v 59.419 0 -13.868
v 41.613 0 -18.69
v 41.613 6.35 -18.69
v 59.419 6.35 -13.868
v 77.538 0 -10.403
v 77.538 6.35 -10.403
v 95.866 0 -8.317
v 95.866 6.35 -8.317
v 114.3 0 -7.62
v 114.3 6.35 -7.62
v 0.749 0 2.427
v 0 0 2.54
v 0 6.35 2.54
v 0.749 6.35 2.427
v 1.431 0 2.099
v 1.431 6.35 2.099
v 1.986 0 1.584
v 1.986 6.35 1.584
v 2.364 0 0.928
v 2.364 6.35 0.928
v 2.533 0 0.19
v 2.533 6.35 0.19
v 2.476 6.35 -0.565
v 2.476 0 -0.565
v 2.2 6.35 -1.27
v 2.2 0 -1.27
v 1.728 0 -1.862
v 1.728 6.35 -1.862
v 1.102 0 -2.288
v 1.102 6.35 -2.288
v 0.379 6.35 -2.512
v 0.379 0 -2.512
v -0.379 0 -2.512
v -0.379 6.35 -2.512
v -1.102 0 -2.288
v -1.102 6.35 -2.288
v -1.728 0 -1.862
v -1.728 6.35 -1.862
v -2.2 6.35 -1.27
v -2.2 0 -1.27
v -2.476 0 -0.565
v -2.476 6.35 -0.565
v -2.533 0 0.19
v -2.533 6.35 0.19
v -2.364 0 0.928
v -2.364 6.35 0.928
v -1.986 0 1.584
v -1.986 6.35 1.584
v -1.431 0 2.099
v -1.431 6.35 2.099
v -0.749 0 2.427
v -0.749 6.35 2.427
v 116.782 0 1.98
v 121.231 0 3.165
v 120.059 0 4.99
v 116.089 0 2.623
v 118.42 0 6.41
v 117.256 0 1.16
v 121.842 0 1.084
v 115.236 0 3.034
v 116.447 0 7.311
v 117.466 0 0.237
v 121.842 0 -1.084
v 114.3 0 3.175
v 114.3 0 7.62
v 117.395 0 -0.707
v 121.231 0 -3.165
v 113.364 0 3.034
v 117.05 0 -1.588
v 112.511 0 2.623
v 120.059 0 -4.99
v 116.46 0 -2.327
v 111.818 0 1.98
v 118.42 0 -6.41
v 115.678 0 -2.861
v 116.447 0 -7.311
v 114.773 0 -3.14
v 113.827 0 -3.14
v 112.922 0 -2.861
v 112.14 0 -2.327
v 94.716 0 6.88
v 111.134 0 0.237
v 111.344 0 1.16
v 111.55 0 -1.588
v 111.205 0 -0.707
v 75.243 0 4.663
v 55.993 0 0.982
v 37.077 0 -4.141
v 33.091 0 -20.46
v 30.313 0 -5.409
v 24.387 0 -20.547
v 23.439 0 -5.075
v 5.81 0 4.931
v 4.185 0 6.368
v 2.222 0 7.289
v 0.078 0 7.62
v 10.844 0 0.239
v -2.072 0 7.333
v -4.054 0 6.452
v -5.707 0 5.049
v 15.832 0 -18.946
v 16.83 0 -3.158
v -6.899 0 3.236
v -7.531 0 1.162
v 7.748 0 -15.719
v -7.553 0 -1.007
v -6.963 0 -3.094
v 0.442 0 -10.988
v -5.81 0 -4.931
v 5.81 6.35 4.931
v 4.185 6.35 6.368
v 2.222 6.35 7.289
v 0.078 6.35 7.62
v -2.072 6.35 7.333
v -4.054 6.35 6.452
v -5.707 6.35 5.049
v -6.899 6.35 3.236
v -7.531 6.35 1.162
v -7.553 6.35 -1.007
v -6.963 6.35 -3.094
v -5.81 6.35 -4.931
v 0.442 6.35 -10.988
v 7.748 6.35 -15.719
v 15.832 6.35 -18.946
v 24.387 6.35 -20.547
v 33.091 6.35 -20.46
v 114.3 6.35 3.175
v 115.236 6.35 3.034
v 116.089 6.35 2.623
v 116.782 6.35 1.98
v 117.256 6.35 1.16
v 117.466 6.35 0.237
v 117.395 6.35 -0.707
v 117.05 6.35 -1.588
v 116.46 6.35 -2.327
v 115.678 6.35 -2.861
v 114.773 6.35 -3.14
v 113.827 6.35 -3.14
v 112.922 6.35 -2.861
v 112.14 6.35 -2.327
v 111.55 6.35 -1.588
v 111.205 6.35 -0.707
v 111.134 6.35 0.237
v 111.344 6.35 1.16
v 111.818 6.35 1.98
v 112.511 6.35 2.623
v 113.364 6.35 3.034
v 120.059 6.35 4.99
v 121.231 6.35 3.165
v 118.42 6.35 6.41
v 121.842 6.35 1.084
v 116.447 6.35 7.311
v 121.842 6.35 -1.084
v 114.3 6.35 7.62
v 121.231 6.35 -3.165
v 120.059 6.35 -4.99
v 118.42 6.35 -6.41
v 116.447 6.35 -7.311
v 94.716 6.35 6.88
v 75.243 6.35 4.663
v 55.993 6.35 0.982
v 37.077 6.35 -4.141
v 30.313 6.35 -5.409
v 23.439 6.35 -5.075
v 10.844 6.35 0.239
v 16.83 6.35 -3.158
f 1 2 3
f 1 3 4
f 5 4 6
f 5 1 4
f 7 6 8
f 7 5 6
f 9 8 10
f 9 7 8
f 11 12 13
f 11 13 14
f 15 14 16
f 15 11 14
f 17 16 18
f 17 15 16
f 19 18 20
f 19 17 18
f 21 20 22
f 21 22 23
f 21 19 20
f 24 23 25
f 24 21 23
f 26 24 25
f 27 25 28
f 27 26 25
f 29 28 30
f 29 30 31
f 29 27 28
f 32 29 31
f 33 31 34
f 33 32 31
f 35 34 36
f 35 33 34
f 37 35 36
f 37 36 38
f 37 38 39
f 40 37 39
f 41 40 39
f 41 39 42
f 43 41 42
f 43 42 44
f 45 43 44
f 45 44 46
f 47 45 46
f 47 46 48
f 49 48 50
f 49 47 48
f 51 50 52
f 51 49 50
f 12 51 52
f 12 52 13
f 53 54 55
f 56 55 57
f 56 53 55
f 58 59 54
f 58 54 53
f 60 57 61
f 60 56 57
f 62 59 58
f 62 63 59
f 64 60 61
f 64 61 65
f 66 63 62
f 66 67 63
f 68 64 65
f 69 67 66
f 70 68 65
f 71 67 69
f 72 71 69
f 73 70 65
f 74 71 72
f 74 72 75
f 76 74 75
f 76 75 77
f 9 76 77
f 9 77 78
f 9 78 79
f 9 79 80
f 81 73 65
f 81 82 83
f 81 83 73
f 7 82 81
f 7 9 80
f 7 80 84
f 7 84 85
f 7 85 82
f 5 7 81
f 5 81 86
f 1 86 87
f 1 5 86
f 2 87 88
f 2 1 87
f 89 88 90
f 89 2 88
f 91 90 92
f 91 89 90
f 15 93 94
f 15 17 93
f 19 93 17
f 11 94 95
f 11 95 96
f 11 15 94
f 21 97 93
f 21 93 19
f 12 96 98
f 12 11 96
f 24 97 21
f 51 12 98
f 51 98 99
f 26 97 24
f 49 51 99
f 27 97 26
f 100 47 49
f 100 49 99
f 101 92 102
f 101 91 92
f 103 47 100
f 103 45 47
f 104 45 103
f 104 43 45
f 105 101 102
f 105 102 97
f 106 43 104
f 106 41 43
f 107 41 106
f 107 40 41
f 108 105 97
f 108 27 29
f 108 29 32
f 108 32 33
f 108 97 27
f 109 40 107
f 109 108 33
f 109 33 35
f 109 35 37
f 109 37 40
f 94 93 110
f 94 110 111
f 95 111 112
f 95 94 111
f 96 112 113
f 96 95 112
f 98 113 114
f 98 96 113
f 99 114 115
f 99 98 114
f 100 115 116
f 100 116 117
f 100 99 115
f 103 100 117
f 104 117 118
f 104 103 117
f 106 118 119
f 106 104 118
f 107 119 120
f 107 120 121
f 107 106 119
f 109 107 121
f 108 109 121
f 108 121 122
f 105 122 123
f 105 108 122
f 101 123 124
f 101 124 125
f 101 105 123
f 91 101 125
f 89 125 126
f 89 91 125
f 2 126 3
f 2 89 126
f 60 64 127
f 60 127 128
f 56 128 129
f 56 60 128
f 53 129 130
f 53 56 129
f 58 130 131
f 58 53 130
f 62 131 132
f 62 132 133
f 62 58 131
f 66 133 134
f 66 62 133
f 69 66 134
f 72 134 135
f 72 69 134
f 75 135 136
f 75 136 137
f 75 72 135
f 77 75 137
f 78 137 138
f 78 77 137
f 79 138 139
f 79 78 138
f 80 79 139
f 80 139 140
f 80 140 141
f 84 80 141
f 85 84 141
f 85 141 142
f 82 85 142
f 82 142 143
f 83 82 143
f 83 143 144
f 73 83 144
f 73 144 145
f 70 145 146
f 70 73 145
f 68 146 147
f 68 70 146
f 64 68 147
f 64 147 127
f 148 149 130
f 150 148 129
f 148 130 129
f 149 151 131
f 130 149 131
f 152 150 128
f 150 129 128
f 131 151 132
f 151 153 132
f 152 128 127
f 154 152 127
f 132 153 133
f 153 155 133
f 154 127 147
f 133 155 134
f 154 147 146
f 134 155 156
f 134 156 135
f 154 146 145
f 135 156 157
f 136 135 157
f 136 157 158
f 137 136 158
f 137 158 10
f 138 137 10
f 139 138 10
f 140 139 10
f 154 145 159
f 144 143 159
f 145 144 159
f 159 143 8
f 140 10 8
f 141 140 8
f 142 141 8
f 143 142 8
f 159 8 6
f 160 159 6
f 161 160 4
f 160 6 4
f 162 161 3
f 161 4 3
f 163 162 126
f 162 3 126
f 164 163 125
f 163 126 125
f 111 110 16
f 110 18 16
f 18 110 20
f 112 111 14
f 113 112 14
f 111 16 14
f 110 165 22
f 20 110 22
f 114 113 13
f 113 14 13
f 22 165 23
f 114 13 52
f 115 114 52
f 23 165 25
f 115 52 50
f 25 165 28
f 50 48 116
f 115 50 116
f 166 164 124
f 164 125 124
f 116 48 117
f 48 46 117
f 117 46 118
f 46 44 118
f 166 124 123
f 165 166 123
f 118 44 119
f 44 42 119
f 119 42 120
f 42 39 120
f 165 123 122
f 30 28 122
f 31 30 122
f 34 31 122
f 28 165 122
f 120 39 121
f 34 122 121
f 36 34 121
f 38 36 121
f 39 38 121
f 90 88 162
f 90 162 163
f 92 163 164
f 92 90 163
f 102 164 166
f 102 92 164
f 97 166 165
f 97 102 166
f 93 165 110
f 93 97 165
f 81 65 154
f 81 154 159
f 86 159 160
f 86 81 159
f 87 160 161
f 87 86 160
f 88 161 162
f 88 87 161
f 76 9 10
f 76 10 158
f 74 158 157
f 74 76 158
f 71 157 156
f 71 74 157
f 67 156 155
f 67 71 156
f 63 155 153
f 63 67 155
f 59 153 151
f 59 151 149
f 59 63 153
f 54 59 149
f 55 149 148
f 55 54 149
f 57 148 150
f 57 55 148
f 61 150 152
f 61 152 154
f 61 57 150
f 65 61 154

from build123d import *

# Parameters (mm, degrees)
SKETCH1_R           = 2.54
SKETCH1_R_2         = 3.175
BOSS_EXTRUDE1_DEPTH = 6.35


with BuildPart() as part:
    # Sketch1 → Boss-Extrude1 (new body)
    with BuildSketch(Plane(origin=(0, 0, 0), x_dir=(1, 0, 0), z_dir=(0, 1, 0))):
        with BuildLine():
            ThreePointArc((5.809594947, -4.930822097), (-4.930822097, -5.809594947), (-5.809594947, 4.930822097))
            ThreePointArc((-5.809594947, 4.930822097), (15.83151286, 18.946305392), (41.613397719, 18.689922307))
            ThreePointArc((41.613397719, 18.689922307), (77.537637008, 10.403344539), (114.3, 7.62))
            ThreePointArc((114.3, 7.62), (121.92, 0), (114.3, -7.62))
            ThreePointArc((114.3, -7.62), (75.243094408, -4.662931519), (37.076624458, 4.140857444))
            ThreePointArc((37.076624458, 4.140857444), (20.078056688, 4.309896491), (5.809594947, -4.930822097))
        make_face()
        with Locations(Location((0, 0, 0), (0, 0, 270))):
            Circle(SKETCH1_R, mode=Mode.SUBTRACT)
        with Locations(Location((114.3, 0, 0), (0, 0, 270))):
            Circle(SKETCH1_R_2, mode=Mode.SUBTRACT)
    extrude(amount=BOSS_EXTRUDE1_DEPTH)


solid = part.part
